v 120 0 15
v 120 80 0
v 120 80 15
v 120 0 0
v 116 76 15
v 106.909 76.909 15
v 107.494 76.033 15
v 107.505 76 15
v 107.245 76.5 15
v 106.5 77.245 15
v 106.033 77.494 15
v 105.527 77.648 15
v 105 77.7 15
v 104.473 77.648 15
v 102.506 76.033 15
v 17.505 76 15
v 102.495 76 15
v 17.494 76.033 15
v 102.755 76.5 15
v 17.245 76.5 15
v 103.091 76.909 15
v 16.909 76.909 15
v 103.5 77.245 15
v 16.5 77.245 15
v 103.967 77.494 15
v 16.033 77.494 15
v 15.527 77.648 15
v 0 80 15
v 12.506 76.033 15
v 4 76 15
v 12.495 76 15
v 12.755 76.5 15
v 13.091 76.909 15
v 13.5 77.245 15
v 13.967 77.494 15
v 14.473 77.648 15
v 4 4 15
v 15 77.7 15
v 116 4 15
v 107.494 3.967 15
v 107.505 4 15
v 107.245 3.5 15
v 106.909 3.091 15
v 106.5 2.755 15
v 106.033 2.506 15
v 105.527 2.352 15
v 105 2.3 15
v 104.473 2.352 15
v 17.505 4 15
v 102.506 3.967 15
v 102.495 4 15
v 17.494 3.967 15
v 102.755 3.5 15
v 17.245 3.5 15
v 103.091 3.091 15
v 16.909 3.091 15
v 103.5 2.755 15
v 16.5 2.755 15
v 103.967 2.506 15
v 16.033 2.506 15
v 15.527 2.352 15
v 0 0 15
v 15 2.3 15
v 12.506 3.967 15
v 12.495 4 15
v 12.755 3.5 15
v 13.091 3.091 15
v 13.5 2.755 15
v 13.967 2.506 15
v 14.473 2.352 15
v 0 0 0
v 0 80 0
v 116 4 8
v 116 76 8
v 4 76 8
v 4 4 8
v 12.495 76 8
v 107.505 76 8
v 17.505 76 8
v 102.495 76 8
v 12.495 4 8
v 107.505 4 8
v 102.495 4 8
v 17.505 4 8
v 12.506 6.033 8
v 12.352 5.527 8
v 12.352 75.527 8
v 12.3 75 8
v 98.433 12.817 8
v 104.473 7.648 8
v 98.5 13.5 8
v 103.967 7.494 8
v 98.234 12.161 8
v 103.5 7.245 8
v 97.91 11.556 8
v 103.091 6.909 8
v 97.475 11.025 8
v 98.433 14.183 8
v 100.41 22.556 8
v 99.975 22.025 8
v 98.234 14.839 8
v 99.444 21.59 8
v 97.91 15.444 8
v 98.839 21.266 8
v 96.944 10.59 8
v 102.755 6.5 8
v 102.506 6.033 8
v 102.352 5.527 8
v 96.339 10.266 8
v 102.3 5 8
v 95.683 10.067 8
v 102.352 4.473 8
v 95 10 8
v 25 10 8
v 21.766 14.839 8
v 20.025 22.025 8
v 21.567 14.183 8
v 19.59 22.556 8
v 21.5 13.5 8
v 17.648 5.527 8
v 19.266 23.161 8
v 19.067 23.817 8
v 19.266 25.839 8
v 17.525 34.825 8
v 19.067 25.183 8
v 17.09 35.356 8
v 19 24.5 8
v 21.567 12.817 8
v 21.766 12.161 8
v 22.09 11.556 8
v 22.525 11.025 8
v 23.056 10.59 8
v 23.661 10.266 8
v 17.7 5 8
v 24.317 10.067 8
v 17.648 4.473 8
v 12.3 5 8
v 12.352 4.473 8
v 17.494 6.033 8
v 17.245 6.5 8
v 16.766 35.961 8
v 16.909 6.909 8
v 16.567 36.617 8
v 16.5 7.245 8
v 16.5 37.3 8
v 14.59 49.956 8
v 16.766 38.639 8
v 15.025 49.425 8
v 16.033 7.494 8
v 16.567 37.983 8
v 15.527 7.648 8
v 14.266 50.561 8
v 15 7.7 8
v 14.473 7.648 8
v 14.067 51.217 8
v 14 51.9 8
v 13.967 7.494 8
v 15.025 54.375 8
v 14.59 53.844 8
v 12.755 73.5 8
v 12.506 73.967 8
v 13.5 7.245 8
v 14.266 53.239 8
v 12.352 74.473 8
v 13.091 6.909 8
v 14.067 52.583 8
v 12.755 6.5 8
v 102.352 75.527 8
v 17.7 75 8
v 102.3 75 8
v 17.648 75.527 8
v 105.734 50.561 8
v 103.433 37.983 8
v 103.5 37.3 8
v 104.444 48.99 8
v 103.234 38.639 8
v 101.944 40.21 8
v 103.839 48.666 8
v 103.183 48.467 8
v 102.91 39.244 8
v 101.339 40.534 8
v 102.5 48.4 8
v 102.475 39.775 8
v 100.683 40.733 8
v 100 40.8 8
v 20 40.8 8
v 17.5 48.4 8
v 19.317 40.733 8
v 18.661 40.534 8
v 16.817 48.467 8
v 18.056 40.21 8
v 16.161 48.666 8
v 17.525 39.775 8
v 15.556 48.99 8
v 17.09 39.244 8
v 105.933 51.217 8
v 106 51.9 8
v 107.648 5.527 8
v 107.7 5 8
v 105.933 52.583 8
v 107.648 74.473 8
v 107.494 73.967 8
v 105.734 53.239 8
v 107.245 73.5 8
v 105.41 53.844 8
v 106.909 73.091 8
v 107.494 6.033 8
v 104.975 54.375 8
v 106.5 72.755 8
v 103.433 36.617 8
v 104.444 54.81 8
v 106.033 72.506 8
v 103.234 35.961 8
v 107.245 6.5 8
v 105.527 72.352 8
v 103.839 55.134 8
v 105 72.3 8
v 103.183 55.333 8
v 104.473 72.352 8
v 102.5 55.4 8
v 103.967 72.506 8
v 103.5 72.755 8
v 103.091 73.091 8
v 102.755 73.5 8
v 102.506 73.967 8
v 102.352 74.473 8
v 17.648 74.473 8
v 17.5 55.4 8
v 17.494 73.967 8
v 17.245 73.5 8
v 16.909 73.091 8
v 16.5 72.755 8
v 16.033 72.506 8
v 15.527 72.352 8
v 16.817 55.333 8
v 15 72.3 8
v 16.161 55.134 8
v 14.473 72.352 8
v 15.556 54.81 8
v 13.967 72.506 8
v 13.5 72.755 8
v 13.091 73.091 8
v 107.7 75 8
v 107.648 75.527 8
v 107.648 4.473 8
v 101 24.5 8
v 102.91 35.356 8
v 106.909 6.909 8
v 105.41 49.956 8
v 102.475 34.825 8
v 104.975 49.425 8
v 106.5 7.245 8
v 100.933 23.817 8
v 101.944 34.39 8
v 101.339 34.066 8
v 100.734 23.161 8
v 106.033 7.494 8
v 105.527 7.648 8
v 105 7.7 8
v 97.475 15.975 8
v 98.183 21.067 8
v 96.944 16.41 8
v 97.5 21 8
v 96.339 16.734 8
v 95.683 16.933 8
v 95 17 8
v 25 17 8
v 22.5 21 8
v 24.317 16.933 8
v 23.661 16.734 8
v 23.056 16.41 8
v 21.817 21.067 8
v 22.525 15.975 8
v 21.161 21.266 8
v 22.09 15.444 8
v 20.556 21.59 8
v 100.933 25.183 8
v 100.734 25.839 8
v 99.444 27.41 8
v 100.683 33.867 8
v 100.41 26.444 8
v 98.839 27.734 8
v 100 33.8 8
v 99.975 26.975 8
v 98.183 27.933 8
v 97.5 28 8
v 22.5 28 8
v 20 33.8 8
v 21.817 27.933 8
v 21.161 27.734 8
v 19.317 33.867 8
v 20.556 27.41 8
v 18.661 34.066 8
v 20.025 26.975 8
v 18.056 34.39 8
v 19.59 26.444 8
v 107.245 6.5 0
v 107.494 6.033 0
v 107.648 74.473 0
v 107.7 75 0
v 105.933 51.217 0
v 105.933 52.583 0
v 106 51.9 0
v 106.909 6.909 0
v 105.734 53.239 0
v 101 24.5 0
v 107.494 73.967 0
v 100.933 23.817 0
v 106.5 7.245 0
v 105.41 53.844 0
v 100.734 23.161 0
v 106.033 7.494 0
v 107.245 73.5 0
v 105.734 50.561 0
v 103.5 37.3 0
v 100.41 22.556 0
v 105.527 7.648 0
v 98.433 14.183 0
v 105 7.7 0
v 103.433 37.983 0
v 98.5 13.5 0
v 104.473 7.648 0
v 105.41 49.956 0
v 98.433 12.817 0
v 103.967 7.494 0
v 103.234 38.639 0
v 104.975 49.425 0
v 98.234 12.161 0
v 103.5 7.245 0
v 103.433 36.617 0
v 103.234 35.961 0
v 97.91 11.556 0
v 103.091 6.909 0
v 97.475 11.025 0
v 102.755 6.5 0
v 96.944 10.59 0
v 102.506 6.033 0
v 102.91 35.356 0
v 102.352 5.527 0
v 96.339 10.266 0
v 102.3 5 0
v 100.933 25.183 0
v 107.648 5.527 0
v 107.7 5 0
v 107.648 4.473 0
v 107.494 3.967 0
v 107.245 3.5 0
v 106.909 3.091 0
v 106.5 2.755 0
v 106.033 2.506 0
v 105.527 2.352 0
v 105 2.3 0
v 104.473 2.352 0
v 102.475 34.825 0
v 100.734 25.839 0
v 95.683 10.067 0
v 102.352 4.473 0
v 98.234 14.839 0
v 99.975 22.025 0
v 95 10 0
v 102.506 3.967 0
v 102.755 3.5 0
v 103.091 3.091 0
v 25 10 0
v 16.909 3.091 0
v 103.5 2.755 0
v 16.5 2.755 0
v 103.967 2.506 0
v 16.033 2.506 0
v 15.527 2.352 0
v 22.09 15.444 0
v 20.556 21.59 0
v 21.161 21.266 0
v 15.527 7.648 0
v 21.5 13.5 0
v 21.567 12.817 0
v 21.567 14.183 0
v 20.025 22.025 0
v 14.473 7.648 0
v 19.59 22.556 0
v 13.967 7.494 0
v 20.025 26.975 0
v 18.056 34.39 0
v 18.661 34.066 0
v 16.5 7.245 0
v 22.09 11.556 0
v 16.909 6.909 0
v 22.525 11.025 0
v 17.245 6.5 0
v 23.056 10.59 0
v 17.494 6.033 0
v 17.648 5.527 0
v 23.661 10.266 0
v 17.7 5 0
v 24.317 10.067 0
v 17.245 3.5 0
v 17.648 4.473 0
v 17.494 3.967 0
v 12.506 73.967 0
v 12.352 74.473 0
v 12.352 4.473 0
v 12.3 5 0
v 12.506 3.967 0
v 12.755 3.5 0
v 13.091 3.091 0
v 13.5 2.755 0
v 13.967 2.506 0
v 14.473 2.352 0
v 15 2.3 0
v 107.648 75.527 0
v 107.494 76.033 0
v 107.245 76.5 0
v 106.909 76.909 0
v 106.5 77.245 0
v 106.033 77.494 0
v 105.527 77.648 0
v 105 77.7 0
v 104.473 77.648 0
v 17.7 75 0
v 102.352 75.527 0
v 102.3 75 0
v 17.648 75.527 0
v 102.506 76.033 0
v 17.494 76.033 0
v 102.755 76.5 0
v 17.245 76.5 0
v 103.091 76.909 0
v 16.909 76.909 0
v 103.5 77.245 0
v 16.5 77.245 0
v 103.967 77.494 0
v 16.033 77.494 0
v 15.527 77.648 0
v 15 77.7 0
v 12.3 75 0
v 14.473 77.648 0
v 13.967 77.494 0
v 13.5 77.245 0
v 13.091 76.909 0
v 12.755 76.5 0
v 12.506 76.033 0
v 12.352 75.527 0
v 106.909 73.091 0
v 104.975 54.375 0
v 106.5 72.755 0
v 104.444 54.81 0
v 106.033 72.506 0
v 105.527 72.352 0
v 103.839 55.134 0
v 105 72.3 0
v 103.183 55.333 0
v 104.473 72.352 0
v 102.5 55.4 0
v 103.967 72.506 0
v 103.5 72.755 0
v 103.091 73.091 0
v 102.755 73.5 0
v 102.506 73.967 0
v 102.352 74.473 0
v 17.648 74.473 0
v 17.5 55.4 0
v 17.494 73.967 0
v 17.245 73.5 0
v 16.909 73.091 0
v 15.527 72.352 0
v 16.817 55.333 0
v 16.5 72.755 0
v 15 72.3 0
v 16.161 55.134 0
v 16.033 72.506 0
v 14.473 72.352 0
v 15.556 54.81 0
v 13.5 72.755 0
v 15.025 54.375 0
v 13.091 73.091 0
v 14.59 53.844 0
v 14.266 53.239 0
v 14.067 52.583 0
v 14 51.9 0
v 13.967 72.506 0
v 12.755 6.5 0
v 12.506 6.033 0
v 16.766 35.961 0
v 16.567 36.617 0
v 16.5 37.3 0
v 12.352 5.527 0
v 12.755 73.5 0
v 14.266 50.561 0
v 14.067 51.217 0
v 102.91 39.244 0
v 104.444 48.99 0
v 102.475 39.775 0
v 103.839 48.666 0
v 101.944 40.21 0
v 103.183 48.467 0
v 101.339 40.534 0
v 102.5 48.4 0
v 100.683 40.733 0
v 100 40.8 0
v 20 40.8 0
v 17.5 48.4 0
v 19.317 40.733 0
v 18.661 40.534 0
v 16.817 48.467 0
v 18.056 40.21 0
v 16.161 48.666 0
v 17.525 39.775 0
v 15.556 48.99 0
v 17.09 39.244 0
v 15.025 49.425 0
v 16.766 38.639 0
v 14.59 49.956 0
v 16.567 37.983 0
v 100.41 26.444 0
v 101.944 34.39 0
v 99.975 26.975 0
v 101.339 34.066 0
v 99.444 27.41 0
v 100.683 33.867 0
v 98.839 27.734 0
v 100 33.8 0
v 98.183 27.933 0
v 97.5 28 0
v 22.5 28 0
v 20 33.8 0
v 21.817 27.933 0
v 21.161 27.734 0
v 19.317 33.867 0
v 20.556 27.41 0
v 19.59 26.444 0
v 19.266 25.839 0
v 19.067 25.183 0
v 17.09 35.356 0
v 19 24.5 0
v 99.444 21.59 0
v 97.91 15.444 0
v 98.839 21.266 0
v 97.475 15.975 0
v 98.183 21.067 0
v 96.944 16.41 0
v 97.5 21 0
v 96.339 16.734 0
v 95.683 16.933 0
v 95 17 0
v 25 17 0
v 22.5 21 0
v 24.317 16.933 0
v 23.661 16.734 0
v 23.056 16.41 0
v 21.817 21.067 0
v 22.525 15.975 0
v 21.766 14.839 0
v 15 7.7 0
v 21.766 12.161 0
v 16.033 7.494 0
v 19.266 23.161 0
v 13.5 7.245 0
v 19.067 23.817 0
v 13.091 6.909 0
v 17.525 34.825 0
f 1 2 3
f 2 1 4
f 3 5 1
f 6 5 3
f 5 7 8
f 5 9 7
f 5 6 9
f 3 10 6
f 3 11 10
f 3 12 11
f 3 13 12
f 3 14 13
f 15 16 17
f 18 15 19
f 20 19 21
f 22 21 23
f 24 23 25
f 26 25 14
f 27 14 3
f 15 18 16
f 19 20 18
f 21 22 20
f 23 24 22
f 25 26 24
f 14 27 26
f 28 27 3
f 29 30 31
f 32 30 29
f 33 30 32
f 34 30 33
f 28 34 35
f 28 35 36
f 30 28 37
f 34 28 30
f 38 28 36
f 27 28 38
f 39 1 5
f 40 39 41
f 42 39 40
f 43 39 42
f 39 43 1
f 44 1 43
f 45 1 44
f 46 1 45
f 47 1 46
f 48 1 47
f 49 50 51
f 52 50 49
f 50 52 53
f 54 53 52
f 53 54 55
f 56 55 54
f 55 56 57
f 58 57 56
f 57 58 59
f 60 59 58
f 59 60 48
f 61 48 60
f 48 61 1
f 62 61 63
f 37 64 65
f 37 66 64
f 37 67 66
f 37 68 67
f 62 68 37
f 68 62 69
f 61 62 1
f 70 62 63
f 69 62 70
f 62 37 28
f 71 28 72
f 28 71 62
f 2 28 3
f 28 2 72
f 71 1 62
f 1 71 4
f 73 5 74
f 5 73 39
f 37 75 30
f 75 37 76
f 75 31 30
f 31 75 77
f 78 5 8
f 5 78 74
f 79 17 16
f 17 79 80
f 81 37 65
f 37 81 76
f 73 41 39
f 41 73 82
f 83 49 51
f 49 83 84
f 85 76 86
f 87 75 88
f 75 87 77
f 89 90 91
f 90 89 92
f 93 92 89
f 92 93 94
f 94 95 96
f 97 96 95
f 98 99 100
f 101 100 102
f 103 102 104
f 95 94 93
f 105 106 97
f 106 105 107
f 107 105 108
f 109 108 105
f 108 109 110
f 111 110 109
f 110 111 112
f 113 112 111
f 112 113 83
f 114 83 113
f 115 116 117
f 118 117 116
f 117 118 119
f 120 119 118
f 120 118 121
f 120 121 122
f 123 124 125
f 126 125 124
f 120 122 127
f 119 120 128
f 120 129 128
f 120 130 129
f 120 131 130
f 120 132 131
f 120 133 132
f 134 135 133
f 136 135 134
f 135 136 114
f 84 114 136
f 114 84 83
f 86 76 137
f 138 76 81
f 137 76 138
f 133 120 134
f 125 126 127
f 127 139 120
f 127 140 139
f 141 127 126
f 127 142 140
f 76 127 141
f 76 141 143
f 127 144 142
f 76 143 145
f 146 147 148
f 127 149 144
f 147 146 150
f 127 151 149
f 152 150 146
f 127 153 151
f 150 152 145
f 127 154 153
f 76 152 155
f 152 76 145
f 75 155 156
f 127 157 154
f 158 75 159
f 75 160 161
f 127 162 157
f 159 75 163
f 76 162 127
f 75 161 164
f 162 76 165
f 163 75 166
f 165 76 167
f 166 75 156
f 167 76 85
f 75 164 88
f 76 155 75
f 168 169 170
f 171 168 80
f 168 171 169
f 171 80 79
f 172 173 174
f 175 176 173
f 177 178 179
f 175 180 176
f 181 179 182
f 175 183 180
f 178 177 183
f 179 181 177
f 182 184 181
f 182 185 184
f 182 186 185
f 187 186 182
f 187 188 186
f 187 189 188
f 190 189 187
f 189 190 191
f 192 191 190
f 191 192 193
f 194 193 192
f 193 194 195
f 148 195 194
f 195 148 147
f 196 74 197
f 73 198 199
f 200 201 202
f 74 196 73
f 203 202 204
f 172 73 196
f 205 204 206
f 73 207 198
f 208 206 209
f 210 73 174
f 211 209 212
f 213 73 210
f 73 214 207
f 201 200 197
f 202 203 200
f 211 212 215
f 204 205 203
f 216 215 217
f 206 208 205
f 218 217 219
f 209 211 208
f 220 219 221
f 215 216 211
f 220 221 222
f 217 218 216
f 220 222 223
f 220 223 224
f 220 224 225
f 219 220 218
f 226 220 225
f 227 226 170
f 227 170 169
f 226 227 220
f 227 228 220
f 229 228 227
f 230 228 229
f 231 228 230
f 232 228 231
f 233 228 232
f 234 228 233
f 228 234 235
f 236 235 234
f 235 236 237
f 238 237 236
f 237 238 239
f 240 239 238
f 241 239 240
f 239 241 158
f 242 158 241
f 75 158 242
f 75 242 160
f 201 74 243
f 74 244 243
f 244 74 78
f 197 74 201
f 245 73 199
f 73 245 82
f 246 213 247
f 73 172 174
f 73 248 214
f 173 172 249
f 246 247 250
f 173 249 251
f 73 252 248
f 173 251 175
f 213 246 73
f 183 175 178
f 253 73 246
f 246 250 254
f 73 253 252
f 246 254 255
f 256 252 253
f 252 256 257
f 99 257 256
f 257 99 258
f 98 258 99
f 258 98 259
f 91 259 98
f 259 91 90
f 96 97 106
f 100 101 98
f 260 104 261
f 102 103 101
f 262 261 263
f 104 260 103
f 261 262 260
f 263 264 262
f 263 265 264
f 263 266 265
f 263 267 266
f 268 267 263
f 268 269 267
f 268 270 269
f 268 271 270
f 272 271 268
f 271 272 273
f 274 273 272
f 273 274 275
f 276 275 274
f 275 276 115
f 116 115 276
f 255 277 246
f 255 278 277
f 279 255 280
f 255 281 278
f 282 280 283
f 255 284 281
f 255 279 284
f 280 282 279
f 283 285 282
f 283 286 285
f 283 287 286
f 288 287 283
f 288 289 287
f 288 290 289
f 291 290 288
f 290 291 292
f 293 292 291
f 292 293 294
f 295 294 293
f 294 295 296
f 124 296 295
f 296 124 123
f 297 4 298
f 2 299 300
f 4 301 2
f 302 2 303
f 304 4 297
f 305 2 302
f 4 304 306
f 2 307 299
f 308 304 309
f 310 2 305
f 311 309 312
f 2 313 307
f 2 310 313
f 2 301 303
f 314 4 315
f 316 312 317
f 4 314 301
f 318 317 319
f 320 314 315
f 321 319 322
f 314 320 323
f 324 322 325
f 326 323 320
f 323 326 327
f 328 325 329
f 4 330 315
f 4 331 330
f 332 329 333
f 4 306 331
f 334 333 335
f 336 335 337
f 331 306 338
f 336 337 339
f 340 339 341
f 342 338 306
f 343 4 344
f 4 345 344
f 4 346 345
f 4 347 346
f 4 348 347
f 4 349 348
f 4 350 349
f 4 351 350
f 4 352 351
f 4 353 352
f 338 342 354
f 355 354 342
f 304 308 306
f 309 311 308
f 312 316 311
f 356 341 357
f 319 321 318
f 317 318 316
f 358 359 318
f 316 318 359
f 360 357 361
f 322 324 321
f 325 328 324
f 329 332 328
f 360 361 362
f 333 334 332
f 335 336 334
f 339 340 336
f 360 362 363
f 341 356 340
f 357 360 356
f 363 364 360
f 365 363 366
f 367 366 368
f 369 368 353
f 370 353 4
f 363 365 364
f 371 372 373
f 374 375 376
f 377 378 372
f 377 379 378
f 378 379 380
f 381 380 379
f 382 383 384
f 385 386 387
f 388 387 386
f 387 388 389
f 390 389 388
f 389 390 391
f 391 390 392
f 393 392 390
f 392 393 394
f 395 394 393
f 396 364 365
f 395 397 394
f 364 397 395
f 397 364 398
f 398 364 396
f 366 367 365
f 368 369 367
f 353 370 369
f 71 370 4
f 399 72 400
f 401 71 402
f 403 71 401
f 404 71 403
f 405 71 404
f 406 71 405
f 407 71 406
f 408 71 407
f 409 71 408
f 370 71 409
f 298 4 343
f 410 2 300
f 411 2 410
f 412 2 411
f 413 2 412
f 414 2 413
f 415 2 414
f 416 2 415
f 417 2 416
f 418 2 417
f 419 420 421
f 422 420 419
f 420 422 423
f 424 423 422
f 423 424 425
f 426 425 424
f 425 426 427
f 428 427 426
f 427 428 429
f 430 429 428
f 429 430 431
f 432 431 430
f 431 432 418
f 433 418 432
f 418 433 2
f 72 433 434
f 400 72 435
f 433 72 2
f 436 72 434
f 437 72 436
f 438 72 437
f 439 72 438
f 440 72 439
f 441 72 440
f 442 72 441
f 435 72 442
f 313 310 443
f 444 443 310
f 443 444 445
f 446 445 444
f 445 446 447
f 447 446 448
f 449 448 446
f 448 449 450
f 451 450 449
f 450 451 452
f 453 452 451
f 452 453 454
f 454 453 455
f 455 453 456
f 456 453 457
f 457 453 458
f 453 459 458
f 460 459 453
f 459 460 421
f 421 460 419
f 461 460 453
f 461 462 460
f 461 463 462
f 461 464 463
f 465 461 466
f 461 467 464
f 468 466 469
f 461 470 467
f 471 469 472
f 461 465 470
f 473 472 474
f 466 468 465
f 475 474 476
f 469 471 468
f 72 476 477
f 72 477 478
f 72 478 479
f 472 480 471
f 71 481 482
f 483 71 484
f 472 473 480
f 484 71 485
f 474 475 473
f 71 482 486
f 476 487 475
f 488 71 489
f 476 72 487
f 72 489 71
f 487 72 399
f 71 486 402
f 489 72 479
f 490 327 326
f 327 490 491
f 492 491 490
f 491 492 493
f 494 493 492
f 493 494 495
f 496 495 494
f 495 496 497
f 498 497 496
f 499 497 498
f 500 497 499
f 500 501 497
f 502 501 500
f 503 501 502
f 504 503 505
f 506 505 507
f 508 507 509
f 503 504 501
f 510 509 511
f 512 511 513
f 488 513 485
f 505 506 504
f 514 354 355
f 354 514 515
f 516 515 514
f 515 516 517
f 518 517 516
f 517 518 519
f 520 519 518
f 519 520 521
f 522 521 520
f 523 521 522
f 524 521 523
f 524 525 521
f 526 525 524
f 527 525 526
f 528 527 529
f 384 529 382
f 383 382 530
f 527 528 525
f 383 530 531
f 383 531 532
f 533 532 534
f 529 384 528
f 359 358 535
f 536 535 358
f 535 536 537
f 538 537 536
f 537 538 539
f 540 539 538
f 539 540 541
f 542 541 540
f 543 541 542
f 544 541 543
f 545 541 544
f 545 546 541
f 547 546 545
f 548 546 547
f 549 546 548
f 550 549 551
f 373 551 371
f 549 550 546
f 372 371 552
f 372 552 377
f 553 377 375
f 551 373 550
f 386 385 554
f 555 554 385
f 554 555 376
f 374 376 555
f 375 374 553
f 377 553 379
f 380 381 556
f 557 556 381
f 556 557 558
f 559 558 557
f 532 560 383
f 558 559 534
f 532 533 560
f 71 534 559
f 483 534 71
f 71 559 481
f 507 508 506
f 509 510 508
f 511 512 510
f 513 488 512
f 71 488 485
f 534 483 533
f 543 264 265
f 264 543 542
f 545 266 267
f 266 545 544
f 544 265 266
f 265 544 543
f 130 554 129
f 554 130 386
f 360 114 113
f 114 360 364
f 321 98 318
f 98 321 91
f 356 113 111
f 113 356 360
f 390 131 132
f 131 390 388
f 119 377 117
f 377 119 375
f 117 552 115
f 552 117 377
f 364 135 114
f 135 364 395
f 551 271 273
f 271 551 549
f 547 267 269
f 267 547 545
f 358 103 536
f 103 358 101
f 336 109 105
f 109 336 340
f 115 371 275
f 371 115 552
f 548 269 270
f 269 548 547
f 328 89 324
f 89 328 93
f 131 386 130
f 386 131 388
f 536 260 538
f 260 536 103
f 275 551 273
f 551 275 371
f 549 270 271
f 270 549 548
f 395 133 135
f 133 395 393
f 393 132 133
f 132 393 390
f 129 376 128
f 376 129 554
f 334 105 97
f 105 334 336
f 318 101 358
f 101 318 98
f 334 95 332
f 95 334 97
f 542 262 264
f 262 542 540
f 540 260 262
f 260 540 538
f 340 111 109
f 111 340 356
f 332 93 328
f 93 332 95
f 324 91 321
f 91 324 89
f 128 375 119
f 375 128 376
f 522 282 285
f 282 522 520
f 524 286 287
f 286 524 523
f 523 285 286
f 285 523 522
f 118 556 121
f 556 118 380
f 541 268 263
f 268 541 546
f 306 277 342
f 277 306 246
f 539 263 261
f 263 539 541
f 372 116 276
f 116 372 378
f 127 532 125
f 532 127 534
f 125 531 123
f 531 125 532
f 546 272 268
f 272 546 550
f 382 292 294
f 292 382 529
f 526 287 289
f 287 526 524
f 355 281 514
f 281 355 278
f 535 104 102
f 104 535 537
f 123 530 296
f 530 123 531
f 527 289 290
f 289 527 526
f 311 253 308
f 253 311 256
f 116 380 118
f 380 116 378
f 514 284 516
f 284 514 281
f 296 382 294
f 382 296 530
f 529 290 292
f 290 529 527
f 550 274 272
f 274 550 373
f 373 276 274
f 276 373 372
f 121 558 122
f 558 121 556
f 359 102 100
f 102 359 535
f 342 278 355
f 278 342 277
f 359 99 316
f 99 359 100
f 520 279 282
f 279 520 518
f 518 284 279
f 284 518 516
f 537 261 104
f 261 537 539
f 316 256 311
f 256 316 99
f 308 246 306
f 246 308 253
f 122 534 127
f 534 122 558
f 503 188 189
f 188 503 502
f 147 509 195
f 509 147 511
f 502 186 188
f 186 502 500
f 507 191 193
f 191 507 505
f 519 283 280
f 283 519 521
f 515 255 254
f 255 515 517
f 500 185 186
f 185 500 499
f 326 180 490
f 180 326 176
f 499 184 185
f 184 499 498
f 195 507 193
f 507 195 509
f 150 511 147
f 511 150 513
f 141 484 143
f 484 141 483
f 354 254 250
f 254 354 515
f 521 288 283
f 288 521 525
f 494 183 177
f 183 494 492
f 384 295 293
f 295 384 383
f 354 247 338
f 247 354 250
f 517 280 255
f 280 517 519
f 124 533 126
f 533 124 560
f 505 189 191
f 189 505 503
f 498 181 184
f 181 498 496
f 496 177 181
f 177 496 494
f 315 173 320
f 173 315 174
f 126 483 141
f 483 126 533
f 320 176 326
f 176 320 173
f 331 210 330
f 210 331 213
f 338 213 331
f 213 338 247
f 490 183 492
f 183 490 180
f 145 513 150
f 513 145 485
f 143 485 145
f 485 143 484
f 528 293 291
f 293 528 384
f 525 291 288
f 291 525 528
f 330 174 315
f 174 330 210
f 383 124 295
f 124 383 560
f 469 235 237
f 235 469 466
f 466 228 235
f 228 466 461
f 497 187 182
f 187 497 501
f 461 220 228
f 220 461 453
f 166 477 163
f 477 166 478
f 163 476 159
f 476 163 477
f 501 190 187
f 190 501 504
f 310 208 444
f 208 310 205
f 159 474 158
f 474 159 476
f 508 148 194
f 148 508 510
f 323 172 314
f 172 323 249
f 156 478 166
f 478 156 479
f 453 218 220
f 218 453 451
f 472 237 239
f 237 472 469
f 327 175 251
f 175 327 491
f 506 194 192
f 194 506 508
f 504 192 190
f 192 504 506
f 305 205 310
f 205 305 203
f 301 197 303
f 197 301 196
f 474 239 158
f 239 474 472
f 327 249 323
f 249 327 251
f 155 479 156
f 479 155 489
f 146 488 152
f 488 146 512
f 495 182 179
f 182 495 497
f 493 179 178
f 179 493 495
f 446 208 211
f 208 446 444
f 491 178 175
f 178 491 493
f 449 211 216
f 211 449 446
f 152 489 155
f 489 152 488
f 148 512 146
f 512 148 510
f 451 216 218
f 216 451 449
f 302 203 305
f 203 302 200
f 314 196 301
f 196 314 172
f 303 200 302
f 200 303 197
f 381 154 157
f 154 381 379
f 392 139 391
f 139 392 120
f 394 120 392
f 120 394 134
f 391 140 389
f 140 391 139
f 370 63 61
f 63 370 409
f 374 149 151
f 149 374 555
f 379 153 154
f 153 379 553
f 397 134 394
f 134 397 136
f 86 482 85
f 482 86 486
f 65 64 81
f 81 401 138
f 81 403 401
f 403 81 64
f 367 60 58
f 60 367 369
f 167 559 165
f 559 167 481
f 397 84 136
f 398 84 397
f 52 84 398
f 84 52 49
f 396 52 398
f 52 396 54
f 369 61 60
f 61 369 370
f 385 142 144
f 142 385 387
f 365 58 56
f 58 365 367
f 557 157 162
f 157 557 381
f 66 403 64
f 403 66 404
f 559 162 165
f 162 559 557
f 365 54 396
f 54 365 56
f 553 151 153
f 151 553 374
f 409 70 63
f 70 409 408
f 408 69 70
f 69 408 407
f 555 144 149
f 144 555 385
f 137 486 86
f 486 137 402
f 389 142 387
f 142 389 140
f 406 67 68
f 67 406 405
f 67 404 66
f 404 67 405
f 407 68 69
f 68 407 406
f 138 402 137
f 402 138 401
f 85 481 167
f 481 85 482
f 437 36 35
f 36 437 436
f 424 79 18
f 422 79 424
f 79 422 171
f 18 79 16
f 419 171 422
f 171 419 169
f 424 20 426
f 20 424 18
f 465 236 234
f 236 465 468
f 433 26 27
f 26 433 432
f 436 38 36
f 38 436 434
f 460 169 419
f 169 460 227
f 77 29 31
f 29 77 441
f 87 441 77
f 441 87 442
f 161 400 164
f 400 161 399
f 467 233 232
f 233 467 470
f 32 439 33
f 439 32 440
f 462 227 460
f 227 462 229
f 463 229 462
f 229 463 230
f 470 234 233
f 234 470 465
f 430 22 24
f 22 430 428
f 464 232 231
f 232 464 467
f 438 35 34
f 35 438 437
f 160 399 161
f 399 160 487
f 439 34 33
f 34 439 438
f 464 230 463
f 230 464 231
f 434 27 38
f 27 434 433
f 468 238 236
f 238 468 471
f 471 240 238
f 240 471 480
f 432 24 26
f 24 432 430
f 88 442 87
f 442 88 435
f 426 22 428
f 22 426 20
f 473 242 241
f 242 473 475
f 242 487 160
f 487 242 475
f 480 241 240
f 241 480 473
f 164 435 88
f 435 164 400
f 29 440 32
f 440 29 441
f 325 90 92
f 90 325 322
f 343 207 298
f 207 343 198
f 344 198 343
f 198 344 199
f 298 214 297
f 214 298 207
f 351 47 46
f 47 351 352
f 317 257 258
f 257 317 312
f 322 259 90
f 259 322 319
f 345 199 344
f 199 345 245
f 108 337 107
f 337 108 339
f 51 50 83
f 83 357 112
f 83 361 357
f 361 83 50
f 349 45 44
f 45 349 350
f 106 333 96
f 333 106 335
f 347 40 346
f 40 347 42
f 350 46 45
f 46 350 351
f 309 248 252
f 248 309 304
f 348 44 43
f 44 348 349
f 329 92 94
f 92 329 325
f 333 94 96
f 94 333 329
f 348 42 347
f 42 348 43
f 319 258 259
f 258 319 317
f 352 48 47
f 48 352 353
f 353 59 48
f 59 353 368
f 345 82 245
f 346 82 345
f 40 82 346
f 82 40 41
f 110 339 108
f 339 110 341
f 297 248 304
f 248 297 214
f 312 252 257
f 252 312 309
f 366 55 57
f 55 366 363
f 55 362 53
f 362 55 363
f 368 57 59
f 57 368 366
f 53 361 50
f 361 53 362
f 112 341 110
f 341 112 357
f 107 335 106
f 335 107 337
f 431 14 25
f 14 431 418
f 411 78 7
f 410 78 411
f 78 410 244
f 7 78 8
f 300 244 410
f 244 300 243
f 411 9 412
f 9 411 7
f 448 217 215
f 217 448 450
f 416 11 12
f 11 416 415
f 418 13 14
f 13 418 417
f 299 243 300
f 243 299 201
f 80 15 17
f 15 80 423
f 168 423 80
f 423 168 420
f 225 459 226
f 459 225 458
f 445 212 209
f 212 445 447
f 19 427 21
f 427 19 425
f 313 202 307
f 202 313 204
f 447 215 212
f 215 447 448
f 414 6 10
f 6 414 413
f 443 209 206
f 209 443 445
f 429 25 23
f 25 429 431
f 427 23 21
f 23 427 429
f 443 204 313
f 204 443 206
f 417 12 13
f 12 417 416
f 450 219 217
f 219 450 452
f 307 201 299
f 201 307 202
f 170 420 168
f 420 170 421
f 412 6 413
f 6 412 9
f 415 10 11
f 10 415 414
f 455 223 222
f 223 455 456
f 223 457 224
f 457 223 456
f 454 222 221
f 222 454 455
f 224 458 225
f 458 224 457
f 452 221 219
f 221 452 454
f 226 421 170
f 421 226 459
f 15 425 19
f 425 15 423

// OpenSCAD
$fn = 32;

// ----------------------------------------------------------------------
// Slotted panel: 120 x 80 mm, 4 ряда of slots
// ----------------------------------------------------------------------

// --- parameters (mm) ---
panel_w = 120;            // panel width
panel_d = 80;             // panel depth
thick = 8;                // panel thickness
slot_w = 7;               // slot width
pitch0 = 11;              // first row pitch
pitch_step = 1.8;         // pitch increase per row
margin = 10;              // margin around the slot field
rows = 4;                 // number of slot rows
mount_d = 5.4;            // mounting holes
mount_x = 45;             // mounting hole offset
rim_h = 15;               // rim height
rim_t = 4;                // rim wall thickness

difference() {
  union() {
    cube([panel_w, panel_d, thick]);
    translate([0, 0, thick - 1]) difference() {
      cube([panel_w, panel_d, rim_h - thick + 1]);
      translate([rim_t, rim_t, -2.5]) cube([panel_w - 2 * rim_t, panel_d - 2 * rim_t, rim_h - thick + 6]);
    }
  }
  /* slot rows: stadium shaped cutters, 2.5 mm clear of both faces */
  /* row 0: pitch 11, length 70 */
  hull() {
    translate([25, 13.5, -2.5]) cylinder(h = thick + 5, d = slot_w);
    translate([95, 13.5, -2.5]) cylinder(h = thick + 5, d = slot_w);
  }
  /* row 1: pitch 12.8, length 75 */
  hull() {
    translate([22.5, 24.5, -2.5]) cylinder(h = thick + 5, d = slot_w);
    translate([97.5, 24.5, -2.5]) cylinder(h = thick + 5, d = slot_w);
  }
  /* row 2: pitch 14.6, length 80 */
  hull() {
    translate([20, 37.3, -2.5]) cylinder(h = thick + 5, d = slot_w);
    translate([100, 37.3, -2.5]) cylinder(h = thick + 5, d = slot_w);
  }
  /* row 3: pitch 16.4, length 85 */
  hull() {
    translate([17.5, 51.9, -2.5]) cylinder(h = thick + 5, d = slot_w);
    translate([102.5, 51.9, -2.5]) cylinder(h = thick + 5, d = slot_w);
  }
  translate([15, 5, -2.5]) cylinder(h = 20, d = mount_d);
  translate([15, 75, -2.5]) cylinder(h = 20, d = mount_d);
  translate([105, 5, -2.5]) cylinder(h = 20, d = mount_d);
  translate([105, 75, -2.5]) cylinder(h = 20, d = mount_d);
}
